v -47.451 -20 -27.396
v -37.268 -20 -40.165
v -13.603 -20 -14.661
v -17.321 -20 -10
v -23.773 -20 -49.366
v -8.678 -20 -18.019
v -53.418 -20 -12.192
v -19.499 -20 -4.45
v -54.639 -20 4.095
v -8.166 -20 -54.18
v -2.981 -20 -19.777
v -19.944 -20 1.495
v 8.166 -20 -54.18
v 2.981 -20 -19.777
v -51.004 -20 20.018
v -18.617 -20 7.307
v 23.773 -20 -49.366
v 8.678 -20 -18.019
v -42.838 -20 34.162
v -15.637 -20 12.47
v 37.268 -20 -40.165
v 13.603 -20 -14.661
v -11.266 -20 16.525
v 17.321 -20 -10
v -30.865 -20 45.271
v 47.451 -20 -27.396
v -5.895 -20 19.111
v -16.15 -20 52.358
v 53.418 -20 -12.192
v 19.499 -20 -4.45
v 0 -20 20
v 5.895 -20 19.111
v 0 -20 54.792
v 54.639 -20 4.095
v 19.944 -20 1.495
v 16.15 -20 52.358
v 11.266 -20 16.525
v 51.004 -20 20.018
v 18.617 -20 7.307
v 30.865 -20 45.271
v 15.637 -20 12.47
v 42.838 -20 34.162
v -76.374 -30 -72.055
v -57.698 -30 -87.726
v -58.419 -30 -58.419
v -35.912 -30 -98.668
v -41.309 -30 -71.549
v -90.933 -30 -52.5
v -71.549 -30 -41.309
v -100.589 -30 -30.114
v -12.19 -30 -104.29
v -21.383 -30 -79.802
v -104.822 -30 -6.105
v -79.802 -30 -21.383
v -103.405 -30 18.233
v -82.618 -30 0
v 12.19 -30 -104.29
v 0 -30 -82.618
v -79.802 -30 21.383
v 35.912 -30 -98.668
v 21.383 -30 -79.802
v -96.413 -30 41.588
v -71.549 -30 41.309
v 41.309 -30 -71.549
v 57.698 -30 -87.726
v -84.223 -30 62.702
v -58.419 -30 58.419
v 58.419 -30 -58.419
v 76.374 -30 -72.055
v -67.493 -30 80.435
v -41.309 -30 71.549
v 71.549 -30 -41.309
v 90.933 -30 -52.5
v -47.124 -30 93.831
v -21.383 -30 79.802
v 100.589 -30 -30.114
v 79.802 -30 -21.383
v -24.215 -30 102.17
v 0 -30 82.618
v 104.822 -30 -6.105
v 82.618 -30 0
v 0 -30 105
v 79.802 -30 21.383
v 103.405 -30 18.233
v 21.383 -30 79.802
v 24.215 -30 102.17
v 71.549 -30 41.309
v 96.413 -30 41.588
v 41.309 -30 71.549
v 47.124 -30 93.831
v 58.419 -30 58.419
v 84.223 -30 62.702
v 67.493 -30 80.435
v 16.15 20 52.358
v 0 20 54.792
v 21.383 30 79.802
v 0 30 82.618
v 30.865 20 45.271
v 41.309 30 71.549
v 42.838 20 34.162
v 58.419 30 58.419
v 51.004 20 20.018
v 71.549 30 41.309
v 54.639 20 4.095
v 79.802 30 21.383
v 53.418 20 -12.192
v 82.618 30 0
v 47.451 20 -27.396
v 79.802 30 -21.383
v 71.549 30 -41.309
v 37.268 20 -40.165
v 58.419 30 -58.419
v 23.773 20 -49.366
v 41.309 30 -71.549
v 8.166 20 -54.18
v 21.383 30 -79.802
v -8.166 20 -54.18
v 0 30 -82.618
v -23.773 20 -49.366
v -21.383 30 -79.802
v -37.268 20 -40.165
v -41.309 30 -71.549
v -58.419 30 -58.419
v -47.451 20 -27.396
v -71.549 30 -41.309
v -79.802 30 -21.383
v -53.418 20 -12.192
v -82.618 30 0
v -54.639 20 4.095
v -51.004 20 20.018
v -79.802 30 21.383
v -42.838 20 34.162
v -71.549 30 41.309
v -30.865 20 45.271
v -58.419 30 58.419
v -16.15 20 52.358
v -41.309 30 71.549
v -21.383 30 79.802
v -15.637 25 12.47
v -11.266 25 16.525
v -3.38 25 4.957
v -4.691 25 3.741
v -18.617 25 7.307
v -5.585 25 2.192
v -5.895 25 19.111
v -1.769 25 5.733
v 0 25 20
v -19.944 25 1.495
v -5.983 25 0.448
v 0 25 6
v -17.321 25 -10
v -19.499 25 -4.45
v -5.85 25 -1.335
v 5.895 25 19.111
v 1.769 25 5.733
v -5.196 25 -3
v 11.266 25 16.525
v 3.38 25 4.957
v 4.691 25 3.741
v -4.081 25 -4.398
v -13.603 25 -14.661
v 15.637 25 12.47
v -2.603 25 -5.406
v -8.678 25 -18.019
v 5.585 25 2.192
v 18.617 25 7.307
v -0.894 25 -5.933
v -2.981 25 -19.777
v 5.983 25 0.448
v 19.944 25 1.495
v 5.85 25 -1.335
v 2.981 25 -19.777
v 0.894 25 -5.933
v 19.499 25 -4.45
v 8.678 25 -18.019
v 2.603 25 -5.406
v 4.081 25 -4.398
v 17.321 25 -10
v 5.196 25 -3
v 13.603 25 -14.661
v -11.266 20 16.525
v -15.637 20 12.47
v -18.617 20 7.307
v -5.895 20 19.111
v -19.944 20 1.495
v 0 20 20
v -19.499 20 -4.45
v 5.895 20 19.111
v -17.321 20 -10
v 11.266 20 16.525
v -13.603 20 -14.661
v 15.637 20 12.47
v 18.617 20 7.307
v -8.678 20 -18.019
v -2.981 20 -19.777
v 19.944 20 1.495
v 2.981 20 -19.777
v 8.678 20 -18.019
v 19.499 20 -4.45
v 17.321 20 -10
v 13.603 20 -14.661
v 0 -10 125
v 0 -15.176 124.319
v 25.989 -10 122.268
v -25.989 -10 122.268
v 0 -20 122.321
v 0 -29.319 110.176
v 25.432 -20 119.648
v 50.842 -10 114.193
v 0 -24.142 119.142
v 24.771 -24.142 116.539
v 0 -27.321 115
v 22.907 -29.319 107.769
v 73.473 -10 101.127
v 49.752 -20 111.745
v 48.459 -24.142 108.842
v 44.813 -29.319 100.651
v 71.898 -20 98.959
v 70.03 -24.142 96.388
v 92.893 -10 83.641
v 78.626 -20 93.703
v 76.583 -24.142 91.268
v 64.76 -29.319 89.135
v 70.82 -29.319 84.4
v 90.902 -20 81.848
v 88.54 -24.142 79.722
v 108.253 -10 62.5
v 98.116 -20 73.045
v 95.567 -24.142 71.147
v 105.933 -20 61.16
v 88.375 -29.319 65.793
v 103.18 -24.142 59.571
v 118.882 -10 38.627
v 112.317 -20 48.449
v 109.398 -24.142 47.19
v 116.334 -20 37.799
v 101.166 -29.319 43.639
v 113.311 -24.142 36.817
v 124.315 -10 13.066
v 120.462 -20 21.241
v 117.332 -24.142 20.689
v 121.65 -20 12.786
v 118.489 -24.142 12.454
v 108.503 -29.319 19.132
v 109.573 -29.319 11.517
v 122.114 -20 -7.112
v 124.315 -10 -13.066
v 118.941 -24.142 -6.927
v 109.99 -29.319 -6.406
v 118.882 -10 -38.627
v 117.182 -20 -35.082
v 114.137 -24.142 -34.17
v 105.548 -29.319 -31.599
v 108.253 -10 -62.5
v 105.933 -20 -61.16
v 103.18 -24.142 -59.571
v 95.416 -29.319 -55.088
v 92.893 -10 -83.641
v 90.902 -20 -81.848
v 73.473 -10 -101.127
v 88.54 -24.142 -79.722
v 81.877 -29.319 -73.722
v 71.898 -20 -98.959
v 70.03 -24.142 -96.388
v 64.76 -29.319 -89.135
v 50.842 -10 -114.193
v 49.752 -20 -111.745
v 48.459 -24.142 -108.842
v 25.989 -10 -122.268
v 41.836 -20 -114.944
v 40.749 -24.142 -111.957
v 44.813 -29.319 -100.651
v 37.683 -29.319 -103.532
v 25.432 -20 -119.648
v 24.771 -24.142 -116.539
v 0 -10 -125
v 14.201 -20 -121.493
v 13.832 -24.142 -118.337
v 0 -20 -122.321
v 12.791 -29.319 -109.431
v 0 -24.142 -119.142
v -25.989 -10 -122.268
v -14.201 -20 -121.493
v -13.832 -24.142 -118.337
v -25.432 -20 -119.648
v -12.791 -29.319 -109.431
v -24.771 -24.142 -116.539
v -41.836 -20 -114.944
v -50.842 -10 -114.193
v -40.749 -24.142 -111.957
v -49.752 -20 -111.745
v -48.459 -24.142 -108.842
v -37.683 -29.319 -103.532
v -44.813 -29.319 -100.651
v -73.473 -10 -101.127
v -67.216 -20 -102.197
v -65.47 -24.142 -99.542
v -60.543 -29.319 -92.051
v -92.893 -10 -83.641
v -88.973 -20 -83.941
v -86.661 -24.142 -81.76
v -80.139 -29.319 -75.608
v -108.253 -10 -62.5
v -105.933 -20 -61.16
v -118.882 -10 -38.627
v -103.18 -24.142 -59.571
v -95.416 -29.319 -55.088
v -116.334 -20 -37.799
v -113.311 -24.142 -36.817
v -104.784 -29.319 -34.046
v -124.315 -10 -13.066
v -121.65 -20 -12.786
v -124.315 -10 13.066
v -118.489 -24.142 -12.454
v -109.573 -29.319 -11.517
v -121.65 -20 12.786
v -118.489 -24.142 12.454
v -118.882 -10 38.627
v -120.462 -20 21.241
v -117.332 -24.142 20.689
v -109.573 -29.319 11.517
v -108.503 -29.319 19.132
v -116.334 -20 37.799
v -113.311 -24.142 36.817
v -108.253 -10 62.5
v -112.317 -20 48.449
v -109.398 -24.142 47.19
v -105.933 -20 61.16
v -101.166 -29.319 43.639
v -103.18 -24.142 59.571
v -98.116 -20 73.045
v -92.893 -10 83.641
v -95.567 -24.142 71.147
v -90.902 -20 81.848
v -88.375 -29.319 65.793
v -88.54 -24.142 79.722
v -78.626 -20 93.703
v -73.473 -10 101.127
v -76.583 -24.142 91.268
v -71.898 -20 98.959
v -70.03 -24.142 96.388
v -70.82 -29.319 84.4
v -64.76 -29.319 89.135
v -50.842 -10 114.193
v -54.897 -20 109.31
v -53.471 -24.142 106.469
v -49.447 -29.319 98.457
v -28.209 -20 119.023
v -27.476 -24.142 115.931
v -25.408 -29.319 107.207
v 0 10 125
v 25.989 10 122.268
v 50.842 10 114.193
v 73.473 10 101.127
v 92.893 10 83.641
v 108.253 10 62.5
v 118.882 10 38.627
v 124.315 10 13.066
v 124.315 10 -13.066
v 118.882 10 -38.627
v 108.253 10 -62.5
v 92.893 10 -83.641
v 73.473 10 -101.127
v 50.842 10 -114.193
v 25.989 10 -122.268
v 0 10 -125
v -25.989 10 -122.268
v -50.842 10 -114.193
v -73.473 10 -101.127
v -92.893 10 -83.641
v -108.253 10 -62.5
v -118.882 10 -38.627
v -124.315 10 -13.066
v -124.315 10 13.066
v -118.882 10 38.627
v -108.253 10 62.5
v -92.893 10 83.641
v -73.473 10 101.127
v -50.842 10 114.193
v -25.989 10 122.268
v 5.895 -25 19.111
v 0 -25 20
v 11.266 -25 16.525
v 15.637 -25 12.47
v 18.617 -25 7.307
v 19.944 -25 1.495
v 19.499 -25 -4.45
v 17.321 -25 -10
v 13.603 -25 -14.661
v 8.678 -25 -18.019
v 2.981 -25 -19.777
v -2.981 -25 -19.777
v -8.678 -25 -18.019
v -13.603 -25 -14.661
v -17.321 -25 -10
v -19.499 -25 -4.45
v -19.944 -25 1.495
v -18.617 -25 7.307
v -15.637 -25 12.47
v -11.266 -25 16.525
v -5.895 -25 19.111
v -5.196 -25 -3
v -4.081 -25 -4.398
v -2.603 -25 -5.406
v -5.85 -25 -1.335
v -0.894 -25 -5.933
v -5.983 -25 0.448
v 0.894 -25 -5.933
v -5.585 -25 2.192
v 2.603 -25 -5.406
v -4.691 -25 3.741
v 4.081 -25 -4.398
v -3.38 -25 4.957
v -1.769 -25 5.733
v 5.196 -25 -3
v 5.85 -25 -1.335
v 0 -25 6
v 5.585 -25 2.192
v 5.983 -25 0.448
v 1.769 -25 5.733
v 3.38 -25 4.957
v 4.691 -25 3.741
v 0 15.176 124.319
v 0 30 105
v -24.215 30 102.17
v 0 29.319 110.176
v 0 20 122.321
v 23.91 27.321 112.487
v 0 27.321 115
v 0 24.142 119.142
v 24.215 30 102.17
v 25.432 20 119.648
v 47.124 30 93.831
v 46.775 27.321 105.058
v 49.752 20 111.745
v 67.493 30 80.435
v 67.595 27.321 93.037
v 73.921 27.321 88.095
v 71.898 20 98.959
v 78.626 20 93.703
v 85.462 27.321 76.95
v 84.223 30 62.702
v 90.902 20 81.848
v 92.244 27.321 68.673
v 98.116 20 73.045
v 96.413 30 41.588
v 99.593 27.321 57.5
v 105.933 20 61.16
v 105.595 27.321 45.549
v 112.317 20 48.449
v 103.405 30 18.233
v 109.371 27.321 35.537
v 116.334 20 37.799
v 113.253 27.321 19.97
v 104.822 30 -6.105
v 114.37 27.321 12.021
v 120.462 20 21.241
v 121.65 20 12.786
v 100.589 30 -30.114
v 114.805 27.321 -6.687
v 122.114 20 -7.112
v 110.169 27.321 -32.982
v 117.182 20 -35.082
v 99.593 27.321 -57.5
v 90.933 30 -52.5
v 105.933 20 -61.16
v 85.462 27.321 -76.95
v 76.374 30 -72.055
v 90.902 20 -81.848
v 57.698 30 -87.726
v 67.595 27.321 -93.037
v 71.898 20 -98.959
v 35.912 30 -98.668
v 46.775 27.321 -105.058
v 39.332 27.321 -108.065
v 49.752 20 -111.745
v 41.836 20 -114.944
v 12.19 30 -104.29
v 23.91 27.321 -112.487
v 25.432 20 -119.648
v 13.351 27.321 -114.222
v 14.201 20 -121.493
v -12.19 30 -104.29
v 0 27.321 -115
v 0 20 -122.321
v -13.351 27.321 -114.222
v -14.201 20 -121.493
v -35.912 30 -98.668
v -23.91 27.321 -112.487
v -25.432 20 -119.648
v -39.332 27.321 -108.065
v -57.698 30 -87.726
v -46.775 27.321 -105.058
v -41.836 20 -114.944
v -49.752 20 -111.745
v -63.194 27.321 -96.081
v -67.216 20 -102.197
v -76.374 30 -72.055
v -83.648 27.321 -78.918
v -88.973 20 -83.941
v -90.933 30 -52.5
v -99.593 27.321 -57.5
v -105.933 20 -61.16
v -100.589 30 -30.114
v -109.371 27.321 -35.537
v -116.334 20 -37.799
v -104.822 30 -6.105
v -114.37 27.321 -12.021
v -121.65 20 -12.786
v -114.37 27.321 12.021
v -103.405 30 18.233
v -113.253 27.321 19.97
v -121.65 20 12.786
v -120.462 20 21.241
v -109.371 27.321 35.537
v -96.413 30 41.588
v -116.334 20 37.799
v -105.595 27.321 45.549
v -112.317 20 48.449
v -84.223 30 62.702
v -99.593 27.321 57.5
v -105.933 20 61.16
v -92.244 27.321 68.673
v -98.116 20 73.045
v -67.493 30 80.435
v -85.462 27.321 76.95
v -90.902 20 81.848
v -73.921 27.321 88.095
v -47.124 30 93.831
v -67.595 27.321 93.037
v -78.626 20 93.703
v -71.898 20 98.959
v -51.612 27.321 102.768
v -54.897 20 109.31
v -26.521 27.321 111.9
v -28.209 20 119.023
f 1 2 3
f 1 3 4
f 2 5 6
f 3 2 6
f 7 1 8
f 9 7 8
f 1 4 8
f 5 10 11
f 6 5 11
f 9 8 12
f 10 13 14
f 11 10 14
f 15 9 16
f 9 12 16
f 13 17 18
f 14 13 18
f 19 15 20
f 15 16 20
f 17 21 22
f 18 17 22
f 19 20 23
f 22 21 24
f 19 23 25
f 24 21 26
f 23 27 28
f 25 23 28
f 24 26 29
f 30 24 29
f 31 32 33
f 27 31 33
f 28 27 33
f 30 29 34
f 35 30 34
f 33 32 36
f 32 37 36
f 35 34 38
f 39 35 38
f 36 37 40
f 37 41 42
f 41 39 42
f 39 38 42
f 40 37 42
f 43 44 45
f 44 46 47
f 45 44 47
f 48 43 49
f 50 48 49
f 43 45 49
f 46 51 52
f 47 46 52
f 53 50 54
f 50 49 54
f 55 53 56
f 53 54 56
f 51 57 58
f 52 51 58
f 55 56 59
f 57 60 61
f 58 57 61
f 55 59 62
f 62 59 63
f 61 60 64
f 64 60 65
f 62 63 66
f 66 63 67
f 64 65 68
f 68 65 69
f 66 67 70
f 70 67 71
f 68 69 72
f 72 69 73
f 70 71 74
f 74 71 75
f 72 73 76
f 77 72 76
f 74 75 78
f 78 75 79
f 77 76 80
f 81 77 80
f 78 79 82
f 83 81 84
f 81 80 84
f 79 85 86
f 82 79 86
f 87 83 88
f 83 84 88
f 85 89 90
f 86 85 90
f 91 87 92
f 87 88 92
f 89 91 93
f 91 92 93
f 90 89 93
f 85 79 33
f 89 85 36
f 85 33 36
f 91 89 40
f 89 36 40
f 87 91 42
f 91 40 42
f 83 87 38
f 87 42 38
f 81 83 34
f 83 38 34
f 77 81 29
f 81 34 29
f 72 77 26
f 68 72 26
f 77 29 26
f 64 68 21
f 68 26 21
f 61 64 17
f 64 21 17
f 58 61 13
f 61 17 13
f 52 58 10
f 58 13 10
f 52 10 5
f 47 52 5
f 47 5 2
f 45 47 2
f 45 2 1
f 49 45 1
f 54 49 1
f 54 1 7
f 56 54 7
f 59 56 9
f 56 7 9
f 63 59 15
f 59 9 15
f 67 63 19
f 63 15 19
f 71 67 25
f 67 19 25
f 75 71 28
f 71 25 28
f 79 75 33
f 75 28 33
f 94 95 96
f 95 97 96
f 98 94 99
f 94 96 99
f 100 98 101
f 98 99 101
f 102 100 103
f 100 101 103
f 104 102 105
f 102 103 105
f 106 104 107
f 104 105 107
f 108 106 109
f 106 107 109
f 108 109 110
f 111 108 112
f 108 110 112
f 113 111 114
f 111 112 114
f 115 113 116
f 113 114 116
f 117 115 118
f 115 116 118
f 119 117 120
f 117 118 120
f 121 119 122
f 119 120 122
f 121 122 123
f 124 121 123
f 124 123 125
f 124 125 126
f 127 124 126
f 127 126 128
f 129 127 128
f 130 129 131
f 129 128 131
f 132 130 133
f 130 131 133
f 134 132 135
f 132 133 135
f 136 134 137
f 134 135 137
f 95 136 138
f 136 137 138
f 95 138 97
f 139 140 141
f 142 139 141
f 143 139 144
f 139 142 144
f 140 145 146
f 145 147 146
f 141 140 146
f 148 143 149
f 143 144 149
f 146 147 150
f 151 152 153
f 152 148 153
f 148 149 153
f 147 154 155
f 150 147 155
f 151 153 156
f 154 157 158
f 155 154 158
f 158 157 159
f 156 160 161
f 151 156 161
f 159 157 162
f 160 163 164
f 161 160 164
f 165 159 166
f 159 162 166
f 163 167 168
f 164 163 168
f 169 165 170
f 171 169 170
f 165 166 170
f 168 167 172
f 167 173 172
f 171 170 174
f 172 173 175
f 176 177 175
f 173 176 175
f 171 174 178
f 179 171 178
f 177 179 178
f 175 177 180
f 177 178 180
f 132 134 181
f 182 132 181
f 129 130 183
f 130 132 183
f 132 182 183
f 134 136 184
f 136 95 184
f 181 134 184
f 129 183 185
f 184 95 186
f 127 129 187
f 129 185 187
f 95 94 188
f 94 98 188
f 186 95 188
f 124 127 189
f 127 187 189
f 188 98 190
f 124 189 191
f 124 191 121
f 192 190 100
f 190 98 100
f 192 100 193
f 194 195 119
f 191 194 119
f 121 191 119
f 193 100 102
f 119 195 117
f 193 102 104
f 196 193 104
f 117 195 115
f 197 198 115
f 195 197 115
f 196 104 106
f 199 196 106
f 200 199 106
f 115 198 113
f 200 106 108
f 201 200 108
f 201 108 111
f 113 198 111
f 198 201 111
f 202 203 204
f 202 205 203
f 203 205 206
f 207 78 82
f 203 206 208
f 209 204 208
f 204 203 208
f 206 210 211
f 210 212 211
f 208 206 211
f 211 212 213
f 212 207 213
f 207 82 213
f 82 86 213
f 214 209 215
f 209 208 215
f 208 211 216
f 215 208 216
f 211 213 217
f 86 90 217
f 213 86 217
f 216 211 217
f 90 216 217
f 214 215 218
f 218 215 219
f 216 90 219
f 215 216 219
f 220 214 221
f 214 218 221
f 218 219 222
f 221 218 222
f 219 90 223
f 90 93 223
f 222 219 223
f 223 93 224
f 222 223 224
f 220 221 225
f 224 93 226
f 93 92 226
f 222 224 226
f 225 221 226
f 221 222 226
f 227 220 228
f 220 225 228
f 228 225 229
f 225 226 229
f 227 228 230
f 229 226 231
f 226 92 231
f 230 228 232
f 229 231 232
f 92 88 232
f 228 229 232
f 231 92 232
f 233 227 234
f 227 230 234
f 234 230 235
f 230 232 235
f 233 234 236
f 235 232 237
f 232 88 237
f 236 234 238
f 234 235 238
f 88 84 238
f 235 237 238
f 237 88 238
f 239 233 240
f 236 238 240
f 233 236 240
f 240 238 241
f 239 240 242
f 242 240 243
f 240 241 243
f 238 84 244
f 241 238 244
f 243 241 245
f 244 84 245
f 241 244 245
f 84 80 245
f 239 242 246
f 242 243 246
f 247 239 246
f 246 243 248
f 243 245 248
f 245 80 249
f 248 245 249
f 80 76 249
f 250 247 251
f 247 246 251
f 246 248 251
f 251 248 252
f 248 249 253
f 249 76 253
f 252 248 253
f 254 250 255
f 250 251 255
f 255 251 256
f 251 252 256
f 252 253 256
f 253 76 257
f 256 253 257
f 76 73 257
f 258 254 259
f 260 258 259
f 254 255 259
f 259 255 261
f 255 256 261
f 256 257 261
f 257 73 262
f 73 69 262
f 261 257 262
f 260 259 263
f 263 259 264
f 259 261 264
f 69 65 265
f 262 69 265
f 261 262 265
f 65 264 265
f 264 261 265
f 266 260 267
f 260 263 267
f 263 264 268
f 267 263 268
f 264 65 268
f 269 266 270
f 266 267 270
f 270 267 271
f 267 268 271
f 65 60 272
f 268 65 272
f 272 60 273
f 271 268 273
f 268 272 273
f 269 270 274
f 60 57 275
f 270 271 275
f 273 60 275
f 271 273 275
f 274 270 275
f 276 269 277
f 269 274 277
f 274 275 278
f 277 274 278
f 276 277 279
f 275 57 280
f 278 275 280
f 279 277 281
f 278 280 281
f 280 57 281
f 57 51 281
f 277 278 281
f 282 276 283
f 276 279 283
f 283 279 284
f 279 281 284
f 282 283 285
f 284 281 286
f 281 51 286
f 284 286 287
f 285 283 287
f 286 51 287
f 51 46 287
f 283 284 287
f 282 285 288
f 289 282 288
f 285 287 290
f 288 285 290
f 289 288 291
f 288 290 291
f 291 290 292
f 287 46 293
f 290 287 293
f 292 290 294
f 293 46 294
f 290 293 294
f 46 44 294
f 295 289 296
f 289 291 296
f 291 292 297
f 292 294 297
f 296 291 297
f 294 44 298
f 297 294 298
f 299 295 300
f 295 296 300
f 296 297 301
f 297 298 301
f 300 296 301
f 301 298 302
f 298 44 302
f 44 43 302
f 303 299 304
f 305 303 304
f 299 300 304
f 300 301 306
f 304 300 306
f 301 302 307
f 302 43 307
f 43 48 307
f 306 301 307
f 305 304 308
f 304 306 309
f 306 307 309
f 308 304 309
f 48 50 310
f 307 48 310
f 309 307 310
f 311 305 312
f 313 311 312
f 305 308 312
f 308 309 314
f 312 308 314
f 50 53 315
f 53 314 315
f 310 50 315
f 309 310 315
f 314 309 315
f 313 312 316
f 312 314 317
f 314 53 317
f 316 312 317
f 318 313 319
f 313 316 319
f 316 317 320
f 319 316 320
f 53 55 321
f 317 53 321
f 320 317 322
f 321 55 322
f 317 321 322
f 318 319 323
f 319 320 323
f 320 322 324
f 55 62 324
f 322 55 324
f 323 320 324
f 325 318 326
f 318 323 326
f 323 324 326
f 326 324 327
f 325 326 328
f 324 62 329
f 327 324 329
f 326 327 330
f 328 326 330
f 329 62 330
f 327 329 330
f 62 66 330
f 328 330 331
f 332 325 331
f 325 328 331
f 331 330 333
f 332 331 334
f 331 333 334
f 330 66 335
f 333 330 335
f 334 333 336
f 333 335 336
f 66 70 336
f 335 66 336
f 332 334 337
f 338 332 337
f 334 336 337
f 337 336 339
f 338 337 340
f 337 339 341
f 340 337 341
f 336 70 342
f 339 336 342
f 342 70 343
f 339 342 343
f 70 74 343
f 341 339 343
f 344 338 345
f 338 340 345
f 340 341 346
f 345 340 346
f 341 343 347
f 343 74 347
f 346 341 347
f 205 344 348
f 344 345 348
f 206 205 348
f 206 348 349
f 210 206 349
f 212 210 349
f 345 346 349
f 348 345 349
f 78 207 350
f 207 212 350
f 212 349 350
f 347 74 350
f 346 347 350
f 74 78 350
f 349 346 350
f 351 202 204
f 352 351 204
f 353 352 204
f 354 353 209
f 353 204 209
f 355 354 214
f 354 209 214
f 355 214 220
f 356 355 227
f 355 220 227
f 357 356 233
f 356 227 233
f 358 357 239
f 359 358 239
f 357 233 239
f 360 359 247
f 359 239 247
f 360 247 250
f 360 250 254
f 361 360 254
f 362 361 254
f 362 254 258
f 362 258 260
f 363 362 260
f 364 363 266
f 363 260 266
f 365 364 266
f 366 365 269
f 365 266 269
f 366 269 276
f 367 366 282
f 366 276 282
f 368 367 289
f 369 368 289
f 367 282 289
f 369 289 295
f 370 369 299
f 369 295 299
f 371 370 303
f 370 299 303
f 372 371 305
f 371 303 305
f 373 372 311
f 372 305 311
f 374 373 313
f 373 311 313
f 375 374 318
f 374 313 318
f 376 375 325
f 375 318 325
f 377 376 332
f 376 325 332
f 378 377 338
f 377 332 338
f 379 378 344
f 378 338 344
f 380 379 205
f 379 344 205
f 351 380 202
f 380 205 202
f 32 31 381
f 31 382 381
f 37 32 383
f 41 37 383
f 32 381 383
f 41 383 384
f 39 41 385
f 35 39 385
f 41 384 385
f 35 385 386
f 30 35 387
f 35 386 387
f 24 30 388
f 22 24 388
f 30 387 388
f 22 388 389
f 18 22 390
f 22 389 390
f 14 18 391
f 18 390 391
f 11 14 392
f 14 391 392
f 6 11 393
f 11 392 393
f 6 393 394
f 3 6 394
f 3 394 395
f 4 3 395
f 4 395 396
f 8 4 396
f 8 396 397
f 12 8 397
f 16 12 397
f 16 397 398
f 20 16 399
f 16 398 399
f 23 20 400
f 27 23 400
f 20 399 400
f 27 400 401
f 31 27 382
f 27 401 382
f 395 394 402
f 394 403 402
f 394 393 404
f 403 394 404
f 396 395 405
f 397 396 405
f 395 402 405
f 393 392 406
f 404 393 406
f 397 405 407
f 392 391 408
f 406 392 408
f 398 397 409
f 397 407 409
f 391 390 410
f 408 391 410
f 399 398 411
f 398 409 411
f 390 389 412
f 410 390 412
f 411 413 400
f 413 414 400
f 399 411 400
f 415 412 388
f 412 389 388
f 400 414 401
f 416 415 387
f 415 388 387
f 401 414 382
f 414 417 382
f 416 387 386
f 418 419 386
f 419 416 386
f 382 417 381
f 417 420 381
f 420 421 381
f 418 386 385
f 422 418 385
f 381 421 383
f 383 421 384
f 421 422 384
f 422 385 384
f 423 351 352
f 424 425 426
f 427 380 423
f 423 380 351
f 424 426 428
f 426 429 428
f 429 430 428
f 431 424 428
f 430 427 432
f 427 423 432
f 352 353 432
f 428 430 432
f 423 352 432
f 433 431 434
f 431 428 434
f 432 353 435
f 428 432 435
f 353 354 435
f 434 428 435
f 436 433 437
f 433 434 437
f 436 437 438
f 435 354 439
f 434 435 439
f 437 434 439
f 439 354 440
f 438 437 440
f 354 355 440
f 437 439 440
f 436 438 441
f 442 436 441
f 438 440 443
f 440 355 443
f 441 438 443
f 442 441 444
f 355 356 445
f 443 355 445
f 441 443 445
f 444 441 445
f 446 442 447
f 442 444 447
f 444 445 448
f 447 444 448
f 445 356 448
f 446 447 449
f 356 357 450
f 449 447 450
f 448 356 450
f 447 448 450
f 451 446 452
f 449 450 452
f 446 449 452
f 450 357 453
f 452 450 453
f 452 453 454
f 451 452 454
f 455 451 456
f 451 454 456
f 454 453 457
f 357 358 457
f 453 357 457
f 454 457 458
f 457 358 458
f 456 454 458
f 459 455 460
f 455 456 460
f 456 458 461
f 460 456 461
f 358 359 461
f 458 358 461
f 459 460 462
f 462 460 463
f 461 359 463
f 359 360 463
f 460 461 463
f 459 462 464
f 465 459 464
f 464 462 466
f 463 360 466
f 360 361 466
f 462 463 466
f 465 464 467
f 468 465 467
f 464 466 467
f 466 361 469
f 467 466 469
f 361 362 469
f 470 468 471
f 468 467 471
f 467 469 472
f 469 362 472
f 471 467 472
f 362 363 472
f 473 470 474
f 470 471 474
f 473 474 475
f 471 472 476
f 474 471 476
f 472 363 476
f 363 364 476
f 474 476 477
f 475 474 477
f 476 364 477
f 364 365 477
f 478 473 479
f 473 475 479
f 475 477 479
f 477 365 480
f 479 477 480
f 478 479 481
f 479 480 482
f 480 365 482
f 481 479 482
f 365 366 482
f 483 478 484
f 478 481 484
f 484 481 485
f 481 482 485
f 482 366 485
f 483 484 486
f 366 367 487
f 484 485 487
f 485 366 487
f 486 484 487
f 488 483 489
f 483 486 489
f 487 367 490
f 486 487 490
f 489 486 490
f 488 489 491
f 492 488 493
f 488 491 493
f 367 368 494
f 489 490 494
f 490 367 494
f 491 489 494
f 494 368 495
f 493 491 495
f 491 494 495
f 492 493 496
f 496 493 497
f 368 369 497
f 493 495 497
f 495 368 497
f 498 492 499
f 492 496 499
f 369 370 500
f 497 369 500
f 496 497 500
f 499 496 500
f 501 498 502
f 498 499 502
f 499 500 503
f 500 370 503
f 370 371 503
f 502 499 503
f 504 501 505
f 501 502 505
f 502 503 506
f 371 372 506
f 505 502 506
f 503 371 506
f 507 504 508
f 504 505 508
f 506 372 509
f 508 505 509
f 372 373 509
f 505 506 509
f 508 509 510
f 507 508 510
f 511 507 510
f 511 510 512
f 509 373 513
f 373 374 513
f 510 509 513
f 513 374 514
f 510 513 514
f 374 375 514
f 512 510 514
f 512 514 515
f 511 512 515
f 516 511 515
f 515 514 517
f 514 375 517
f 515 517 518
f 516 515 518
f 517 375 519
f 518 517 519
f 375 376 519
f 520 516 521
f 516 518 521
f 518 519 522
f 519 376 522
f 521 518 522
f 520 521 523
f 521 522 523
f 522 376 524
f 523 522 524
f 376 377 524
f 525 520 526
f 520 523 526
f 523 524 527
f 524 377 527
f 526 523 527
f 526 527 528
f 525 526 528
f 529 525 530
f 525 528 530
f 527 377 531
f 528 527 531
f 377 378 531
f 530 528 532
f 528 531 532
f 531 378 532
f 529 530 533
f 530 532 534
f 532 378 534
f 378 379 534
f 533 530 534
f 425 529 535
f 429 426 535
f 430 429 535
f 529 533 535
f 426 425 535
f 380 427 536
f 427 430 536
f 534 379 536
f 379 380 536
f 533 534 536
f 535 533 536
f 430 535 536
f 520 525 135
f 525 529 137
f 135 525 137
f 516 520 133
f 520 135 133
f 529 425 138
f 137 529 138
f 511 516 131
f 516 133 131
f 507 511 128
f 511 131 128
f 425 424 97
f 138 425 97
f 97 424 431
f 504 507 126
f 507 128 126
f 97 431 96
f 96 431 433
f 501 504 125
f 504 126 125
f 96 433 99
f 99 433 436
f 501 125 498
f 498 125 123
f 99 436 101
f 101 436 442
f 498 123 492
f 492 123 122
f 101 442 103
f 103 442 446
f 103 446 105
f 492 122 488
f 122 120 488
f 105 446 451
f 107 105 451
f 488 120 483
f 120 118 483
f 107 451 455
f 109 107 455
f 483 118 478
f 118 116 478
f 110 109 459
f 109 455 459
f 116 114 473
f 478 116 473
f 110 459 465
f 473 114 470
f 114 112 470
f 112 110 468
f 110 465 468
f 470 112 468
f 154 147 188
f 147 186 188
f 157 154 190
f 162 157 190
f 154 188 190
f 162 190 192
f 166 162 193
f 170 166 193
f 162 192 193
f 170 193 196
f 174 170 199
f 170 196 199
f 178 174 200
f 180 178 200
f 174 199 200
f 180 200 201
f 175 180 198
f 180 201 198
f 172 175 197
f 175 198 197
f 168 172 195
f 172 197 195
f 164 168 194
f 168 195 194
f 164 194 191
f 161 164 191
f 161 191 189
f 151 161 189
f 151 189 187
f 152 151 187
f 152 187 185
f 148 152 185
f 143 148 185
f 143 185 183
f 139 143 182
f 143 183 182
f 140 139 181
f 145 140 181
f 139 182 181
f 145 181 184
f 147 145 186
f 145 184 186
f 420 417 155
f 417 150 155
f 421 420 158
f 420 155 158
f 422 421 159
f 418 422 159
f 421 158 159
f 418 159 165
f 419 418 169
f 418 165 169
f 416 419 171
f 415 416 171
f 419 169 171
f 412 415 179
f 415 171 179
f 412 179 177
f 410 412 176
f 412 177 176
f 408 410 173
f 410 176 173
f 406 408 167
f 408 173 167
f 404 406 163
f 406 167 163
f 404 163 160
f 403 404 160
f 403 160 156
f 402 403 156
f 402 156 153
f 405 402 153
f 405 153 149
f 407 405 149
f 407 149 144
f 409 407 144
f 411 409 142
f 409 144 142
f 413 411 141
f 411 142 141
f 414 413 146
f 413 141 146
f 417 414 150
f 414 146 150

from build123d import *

# Parameters (mm, degrees)
F2_R = 20


with BuildPart() as f1:
    # F0 (on Right) → F1 (revolve)
    with BuildSketch(Plane.YZ):
        Polygon((-30, 82.617566), (-20, 54.791786), (-20, 20), (-25, 20), (-25, 6), (0, 6), (20, 6), (25, 6), (25, 20), (20, 20), (20, 54.791786), (30, 82.617566), (30, 125), (0, 125), (-30, 125), align=None)
    revolve(axis=Axis((0, 0.420819, 0), (0, 1, 0)))

    # F2
    f2_edges = [f1.edges().sort_by_distance(p)[0] for p in [
        (0, -30, -125),
        (0, 30, -125),
    ]]
    fillet(f2_edges, radius=F2_R)


solid = f1.part
